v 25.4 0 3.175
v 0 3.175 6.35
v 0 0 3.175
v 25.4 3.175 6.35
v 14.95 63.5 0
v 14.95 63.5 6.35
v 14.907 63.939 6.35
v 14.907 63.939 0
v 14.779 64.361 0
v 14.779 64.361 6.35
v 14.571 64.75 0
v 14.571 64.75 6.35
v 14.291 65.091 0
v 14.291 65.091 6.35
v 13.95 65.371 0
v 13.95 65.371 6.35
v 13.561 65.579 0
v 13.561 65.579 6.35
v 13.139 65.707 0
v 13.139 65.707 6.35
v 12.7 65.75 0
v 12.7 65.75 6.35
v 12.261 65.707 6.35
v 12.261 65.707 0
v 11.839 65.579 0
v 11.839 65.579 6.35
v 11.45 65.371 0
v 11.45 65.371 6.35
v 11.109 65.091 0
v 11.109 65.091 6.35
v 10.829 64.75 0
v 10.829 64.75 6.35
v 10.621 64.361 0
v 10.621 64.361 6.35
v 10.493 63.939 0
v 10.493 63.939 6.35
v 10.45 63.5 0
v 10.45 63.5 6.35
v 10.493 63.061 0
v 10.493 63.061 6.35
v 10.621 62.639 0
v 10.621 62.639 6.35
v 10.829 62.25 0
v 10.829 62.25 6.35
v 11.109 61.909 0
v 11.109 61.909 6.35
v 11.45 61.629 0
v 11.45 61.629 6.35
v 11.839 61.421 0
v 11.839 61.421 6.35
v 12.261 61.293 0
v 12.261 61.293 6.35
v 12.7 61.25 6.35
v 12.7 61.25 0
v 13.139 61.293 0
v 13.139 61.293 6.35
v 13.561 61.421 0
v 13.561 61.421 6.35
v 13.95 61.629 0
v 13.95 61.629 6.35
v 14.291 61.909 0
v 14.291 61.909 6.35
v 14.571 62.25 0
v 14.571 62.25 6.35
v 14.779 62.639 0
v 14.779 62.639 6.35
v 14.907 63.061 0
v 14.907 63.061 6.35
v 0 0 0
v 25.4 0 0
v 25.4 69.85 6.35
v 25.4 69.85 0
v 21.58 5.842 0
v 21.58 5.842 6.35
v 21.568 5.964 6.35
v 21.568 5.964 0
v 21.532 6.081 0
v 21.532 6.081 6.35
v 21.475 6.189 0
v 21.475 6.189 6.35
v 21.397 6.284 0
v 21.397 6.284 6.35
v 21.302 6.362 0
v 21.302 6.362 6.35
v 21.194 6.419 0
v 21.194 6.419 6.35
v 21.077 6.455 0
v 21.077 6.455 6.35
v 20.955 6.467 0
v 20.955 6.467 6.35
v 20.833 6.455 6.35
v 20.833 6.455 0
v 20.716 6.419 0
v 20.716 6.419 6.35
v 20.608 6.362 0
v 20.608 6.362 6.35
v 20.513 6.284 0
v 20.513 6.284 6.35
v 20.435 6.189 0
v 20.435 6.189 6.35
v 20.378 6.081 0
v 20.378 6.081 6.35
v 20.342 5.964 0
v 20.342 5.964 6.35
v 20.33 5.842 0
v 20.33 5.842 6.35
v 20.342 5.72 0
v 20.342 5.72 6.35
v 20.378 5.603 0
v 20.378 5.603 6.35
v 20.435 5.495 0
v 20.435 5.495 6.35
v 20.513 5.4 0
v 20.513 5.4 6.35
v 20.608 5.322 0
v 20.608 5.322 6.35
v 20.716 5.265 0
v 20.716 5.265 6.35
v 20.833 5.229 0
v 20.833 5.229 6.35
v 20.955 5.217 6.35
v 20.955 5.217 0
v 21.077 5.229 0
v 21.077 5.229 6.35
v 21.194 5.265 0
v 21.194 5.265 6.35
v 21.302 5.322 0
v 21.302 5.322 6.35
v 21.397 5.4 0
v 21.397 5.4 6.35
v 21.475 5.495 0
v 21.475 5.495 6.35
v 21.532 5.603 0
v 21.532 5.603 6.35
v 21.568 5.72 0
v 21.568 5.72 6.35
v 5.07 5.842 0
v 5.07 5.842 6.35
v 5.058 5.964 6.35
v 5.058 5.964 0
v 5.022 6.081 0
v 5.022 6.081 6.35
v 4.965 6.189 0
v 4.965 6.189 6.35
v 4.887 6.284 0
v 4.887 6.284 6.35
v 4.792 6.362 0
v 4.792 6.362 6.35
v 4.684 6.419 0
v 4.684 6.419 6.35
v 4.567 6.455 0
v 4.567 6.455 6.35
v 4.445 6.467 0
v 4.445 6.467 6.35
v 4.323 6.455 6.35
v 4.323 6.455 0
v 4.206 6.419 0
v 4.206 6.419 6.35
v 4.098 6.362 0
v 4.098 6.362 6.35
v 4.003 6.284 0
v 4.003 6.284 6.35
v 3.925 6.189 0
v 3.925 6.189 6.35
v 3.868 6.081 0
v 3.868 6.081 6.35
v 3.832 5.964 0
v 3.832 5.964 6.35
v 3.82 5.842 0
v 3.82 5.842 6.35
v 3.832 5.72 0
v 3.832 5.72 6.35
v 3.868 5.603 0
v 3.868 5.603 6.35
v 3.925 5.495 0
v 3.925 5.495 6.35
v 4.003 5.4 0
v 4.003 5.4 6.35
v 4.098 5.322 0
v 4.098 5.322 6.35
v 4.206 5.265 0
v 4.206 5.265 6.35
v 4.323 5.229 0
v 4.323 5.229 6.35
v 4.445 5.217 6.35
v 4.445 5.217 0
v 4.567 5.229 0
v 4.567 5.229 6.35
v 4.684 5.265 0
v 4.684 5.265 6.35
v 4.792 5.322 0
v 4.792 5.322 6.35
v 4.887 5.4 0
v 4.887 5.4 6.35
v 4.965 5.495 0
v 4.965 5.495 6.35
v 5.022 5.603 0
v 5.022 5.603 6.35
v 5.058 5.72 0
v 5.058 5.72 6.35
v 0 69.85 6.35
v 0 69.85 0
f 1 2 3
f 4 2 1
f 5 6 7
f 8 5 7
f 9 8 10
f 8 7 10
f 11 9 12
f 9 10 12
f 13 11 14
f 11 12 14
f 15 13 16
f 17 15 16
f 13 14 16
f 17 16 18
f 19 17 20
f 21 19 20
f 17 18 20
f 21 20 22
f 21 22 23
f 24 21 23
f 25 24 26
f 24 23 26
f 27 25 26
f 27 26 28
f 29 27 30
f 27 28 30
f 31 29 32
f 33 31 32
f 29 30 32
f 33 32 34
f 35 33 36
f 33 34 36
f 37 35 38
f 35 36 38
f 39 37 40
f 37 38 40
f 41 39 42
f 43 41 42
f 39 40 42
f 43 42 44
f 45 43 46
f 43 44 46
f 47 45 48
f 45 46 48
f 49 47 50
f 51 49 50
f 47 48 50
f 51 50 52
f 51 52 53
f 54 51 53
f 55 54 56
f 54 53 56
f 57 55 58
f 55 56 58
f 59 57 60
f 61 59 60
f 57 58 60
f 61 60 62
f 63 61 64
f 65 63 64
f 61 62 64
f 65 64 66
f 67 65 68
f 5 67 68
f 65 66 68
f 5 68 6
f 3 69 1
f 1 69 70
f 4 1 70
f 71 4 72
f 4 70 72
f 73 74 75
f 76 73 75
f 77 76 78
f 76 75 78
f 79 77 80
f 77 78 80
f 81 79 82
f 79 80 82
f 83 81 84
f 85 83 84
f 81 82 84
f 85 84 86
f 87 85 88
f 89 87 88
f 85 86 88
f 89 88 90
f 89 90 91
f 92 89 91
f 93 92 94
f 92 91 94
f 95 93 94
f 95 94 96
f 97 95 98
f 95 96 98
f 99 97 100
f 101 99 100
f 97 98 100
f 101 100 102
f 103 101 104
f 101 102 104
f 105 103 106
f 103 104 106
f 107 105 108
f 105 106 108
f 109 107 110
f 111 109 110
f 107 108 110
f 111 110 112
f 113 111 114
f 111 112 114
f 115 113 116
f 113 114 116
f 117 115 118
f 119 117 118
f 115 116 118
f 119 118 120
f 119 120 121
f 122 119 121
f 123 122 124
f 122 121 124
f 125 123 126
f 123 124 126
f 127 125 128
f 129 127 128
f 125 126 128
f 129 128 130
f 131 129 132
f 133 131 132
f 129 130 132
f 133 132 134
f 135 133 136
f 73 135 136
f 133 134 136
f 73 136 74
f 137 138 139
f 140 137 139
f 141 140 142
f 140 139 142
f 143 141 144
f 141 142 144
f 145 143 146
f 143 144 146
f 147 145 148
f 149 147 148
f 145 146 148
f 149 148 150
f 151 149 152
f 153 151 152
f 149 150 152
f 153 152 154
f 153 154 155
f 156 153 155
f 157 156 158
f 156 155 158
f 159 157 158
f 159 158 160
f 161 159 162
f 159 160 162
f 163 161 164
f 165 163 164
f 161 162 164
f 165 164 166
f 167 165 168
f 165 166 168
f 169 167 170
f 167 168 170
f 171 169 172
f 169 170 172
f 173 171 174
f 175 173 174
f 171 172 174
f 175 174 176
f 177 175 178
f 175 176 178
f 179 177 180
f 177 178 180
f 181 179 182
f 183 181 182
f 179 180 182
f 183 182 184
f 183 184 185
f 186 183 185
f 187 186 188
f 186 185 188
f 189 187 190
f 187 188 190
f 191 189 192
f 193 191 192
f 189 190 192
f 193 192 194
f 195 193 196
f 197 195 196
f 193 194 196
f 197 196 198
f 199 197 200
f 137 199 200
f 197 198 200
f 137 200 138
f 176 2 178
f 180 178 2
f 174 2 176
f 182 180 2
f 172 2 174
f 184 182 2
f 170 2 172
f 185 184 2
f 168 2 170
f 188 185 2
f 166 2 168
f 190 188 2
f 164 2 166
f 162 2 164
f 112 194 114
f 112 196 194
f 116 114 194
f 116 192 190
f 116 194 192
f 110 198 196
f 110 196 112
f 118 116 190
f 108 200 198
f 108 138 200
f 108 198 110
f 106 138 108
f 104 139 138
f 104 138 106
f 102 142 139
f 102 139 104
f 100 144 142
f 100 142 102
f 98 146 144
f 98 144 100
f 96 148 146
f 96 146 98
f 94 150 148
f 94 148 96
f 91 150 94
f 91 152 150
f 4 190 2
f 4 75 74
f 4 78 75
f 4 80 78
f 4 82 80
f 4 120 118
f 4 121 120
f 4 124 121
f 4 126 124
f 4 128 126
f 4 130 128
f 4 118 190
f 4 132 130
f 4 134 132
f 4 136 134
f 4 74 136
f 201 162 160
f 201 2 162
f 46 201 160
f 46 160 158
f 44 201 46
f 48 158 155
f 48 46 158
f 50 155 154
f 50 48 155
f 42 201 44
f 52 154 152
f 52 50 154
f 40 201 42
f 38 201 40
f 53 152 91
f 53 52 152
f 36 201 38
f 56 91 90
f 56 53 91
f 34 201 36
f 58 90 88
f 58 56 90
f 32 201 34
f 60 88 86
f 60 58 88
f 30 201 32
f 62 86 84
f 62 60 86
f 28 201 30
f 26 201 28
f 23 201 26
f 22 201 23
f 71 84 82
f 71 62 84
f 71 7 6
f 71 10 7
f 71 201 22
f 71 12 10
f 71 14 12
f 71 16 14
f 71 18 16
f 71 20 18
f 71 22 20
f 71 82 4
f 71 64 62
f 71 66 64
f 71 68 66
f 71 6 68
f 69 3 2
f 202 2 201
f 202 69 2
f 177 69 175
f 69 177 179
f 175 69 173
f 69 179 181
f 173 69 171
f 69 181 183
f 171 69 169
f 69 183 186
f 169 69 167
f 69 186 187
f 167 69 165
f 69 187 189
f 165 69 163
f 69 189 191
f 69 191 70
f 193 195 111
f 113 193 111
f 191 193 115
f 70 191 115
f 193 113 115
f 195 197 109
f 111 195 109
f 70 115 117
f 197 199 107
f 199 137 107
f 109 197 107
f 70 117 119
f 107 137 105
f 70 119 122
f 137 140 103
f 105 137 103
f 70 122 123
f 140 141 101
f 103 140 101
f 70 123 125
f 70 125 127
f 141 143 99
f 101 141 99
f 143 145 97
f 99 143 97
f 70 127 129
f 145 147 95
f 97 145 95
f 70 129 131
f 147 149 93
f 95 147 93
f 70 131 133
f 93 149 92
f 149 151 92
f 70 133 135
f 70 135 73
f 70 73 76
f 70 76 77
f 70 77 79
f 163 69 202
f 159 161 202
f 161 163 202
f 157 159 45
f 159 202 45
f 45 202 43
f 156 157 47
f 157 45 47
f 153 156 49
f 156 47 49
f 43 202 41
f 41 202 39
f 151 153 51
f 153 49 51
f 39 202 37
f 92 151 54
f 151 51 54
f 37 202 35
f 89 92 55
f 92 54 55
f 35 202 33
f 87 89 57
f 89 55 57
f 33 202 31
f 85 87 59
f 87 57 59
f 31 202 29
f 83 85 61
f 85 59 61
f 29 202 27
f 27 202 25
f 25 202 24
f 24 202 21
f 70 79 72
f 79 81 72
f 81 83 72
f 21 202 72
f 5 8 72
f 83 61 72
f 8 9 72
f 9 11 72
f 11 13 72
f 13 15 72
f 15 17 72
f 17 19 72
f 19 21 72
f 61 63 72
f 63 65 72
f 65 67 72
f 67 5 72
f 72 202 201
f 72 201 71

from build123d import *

# Parameters (mm, degrees)
SKETCH1_W           = 25.4
SKETCH1_H           = 69.85
BOSS_EXTRUDE1_DEPTH = 6.35
SKETCH2_R           = 2.25
SKETCH2_R_2         = 0.625
CUT_EXTRUDE1_DEPTH  = 6.35
CHAMFER1_SIZE       = 3.175


with BuildPart() as part:
    # Sketch1 → Boss-Extrude1 (new body)
    with BuildSketch(Plane.XY):
        with Locations((12.7, 34.925)):
            Rectangle(SKETCH1_W, SKETCH1_H)
    extrude(amount=BOSS_EXTRUDE1_DEPTH)

    # Sketch2 → Cut-Extrude1 (cut)
    with BuildSketch(Plane.XY.offset(6.35)):
        with Locations((12.7, 63.5)):
            Circle(SKETCH2_R)
        with Locations((4.445, 5.842)):
            Circle(SKETCH2_R_2)
        with Locations((20.955, 5.842)):
            Circle(SKETCH2_R_2)
    extrude(amount=-CUT_EXTRUDE1_DEPTH, mode=Mode.SUBTRACT)

    # Chamfer1
    chamfer1_edges = [part.edges().sort_by_distance(p)[0] for p in [
        (12.7, 0, 6.35),
    ]]
    chamfer(chamfer1_edges, length=CHAMFER1_SIZE)


solid = part.part
